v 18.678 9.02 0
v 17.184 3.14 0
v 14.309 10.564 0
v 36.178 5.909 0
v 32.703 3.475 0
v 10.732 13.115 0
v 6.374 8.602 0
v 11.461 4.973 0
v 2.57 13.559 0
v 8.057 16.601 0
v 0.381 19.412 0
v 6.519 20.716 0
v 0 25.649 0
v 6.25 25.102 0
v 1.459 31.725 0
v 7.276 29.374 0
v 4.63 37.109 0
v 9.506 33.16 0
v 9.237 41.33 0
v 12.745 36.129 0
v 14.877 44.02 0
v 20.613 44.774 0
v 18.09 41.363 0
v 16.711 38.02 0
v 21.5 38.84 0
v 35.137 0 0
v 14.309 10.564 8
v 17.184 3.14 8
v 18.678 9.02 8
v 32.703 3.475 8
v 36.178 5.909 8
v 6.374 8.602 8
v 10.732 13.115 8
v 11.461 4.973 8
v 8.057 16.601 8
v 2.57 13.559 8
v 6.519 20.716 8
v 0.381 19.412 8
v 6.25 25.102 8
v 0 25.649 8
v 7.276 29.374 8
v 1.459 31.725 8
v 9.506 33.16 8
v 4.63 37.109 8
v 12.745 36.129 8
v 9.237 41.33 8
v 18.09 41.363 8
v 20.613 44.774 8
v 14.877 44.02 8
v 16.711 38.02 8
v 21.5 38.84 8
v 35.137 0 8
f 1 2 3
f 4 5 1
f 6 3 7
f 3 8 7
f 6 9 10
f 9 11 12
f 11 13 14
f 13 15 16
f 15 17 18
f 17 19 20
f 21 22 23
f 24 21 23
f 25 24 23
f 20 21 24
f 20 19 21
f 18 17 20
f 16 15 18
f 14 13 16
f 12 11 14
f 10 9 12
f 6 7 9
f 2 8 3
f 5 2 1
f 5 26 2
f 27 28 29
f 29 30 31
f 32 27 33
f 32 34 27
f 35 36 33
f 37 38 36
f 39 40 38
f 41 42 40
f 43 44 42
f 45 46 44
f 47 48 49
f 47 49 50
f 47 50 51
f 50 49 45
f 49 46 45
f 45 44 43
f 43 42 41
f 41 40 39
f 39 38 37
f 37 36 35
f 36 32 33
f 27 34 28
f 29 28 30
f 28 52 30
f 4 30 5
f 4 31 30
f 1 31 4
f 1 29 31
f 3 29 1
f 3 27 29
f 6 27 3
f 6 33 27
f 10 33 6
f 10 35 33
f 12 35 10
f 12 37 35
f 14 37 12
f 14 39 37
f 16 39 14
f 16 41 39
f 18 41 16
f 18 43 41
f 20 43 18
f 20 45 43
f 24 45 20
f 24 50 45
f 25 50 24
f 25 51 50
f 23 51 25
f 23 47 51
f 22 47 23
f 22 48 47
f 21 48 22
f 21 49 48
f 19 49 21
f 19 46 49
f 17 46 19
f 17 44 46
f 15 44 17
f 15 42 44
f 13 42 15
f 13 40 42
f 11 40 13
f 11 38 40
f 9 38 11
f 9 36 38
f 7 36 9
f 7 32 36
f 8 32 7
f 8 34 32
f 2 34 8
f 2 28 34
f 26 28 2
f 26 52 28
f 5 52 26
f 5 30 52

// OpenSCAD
$fn = 32;

// ----------------------------------------------------------------------
// Hook plate: curl radius 18 mm over 170 degrees, 6 mm thick band
// ----------------------------------------------------------------------

// --- parameters (mm) ---
profile_height = 8;       // extrusion height
profile_points = 26;      // points of the closed outline

profile = [[18.09, 41.363], [20.613, 44.774], [14.877, 44.02], [9.237, 41.33], [4.63, 37.109], [1.459, 31.725], [0, 25.649], [0.381, 19.412], [2.57, 13.559], [6.374, 8.602], [11.461, 4.973], [17.184, 3.14], [35.137, 0], [32.703, 3.475], [36.178, 5.909], [18.678, 9.02], [14.309, 10.564], [10.732, 13.115], [8.057, 16.601], [6.519, 20.716], [6.25, 25.102], [7.276, 29.374], [9.506, 33.16], [12.745, 36.129], [16.711, 38.02], [21.5, 38.84]];  // single closed polygon, 26 points, counter clockwise

// --- the one profile operation ---
linear_extrude(height = profile_height) polygon(points = profile);
